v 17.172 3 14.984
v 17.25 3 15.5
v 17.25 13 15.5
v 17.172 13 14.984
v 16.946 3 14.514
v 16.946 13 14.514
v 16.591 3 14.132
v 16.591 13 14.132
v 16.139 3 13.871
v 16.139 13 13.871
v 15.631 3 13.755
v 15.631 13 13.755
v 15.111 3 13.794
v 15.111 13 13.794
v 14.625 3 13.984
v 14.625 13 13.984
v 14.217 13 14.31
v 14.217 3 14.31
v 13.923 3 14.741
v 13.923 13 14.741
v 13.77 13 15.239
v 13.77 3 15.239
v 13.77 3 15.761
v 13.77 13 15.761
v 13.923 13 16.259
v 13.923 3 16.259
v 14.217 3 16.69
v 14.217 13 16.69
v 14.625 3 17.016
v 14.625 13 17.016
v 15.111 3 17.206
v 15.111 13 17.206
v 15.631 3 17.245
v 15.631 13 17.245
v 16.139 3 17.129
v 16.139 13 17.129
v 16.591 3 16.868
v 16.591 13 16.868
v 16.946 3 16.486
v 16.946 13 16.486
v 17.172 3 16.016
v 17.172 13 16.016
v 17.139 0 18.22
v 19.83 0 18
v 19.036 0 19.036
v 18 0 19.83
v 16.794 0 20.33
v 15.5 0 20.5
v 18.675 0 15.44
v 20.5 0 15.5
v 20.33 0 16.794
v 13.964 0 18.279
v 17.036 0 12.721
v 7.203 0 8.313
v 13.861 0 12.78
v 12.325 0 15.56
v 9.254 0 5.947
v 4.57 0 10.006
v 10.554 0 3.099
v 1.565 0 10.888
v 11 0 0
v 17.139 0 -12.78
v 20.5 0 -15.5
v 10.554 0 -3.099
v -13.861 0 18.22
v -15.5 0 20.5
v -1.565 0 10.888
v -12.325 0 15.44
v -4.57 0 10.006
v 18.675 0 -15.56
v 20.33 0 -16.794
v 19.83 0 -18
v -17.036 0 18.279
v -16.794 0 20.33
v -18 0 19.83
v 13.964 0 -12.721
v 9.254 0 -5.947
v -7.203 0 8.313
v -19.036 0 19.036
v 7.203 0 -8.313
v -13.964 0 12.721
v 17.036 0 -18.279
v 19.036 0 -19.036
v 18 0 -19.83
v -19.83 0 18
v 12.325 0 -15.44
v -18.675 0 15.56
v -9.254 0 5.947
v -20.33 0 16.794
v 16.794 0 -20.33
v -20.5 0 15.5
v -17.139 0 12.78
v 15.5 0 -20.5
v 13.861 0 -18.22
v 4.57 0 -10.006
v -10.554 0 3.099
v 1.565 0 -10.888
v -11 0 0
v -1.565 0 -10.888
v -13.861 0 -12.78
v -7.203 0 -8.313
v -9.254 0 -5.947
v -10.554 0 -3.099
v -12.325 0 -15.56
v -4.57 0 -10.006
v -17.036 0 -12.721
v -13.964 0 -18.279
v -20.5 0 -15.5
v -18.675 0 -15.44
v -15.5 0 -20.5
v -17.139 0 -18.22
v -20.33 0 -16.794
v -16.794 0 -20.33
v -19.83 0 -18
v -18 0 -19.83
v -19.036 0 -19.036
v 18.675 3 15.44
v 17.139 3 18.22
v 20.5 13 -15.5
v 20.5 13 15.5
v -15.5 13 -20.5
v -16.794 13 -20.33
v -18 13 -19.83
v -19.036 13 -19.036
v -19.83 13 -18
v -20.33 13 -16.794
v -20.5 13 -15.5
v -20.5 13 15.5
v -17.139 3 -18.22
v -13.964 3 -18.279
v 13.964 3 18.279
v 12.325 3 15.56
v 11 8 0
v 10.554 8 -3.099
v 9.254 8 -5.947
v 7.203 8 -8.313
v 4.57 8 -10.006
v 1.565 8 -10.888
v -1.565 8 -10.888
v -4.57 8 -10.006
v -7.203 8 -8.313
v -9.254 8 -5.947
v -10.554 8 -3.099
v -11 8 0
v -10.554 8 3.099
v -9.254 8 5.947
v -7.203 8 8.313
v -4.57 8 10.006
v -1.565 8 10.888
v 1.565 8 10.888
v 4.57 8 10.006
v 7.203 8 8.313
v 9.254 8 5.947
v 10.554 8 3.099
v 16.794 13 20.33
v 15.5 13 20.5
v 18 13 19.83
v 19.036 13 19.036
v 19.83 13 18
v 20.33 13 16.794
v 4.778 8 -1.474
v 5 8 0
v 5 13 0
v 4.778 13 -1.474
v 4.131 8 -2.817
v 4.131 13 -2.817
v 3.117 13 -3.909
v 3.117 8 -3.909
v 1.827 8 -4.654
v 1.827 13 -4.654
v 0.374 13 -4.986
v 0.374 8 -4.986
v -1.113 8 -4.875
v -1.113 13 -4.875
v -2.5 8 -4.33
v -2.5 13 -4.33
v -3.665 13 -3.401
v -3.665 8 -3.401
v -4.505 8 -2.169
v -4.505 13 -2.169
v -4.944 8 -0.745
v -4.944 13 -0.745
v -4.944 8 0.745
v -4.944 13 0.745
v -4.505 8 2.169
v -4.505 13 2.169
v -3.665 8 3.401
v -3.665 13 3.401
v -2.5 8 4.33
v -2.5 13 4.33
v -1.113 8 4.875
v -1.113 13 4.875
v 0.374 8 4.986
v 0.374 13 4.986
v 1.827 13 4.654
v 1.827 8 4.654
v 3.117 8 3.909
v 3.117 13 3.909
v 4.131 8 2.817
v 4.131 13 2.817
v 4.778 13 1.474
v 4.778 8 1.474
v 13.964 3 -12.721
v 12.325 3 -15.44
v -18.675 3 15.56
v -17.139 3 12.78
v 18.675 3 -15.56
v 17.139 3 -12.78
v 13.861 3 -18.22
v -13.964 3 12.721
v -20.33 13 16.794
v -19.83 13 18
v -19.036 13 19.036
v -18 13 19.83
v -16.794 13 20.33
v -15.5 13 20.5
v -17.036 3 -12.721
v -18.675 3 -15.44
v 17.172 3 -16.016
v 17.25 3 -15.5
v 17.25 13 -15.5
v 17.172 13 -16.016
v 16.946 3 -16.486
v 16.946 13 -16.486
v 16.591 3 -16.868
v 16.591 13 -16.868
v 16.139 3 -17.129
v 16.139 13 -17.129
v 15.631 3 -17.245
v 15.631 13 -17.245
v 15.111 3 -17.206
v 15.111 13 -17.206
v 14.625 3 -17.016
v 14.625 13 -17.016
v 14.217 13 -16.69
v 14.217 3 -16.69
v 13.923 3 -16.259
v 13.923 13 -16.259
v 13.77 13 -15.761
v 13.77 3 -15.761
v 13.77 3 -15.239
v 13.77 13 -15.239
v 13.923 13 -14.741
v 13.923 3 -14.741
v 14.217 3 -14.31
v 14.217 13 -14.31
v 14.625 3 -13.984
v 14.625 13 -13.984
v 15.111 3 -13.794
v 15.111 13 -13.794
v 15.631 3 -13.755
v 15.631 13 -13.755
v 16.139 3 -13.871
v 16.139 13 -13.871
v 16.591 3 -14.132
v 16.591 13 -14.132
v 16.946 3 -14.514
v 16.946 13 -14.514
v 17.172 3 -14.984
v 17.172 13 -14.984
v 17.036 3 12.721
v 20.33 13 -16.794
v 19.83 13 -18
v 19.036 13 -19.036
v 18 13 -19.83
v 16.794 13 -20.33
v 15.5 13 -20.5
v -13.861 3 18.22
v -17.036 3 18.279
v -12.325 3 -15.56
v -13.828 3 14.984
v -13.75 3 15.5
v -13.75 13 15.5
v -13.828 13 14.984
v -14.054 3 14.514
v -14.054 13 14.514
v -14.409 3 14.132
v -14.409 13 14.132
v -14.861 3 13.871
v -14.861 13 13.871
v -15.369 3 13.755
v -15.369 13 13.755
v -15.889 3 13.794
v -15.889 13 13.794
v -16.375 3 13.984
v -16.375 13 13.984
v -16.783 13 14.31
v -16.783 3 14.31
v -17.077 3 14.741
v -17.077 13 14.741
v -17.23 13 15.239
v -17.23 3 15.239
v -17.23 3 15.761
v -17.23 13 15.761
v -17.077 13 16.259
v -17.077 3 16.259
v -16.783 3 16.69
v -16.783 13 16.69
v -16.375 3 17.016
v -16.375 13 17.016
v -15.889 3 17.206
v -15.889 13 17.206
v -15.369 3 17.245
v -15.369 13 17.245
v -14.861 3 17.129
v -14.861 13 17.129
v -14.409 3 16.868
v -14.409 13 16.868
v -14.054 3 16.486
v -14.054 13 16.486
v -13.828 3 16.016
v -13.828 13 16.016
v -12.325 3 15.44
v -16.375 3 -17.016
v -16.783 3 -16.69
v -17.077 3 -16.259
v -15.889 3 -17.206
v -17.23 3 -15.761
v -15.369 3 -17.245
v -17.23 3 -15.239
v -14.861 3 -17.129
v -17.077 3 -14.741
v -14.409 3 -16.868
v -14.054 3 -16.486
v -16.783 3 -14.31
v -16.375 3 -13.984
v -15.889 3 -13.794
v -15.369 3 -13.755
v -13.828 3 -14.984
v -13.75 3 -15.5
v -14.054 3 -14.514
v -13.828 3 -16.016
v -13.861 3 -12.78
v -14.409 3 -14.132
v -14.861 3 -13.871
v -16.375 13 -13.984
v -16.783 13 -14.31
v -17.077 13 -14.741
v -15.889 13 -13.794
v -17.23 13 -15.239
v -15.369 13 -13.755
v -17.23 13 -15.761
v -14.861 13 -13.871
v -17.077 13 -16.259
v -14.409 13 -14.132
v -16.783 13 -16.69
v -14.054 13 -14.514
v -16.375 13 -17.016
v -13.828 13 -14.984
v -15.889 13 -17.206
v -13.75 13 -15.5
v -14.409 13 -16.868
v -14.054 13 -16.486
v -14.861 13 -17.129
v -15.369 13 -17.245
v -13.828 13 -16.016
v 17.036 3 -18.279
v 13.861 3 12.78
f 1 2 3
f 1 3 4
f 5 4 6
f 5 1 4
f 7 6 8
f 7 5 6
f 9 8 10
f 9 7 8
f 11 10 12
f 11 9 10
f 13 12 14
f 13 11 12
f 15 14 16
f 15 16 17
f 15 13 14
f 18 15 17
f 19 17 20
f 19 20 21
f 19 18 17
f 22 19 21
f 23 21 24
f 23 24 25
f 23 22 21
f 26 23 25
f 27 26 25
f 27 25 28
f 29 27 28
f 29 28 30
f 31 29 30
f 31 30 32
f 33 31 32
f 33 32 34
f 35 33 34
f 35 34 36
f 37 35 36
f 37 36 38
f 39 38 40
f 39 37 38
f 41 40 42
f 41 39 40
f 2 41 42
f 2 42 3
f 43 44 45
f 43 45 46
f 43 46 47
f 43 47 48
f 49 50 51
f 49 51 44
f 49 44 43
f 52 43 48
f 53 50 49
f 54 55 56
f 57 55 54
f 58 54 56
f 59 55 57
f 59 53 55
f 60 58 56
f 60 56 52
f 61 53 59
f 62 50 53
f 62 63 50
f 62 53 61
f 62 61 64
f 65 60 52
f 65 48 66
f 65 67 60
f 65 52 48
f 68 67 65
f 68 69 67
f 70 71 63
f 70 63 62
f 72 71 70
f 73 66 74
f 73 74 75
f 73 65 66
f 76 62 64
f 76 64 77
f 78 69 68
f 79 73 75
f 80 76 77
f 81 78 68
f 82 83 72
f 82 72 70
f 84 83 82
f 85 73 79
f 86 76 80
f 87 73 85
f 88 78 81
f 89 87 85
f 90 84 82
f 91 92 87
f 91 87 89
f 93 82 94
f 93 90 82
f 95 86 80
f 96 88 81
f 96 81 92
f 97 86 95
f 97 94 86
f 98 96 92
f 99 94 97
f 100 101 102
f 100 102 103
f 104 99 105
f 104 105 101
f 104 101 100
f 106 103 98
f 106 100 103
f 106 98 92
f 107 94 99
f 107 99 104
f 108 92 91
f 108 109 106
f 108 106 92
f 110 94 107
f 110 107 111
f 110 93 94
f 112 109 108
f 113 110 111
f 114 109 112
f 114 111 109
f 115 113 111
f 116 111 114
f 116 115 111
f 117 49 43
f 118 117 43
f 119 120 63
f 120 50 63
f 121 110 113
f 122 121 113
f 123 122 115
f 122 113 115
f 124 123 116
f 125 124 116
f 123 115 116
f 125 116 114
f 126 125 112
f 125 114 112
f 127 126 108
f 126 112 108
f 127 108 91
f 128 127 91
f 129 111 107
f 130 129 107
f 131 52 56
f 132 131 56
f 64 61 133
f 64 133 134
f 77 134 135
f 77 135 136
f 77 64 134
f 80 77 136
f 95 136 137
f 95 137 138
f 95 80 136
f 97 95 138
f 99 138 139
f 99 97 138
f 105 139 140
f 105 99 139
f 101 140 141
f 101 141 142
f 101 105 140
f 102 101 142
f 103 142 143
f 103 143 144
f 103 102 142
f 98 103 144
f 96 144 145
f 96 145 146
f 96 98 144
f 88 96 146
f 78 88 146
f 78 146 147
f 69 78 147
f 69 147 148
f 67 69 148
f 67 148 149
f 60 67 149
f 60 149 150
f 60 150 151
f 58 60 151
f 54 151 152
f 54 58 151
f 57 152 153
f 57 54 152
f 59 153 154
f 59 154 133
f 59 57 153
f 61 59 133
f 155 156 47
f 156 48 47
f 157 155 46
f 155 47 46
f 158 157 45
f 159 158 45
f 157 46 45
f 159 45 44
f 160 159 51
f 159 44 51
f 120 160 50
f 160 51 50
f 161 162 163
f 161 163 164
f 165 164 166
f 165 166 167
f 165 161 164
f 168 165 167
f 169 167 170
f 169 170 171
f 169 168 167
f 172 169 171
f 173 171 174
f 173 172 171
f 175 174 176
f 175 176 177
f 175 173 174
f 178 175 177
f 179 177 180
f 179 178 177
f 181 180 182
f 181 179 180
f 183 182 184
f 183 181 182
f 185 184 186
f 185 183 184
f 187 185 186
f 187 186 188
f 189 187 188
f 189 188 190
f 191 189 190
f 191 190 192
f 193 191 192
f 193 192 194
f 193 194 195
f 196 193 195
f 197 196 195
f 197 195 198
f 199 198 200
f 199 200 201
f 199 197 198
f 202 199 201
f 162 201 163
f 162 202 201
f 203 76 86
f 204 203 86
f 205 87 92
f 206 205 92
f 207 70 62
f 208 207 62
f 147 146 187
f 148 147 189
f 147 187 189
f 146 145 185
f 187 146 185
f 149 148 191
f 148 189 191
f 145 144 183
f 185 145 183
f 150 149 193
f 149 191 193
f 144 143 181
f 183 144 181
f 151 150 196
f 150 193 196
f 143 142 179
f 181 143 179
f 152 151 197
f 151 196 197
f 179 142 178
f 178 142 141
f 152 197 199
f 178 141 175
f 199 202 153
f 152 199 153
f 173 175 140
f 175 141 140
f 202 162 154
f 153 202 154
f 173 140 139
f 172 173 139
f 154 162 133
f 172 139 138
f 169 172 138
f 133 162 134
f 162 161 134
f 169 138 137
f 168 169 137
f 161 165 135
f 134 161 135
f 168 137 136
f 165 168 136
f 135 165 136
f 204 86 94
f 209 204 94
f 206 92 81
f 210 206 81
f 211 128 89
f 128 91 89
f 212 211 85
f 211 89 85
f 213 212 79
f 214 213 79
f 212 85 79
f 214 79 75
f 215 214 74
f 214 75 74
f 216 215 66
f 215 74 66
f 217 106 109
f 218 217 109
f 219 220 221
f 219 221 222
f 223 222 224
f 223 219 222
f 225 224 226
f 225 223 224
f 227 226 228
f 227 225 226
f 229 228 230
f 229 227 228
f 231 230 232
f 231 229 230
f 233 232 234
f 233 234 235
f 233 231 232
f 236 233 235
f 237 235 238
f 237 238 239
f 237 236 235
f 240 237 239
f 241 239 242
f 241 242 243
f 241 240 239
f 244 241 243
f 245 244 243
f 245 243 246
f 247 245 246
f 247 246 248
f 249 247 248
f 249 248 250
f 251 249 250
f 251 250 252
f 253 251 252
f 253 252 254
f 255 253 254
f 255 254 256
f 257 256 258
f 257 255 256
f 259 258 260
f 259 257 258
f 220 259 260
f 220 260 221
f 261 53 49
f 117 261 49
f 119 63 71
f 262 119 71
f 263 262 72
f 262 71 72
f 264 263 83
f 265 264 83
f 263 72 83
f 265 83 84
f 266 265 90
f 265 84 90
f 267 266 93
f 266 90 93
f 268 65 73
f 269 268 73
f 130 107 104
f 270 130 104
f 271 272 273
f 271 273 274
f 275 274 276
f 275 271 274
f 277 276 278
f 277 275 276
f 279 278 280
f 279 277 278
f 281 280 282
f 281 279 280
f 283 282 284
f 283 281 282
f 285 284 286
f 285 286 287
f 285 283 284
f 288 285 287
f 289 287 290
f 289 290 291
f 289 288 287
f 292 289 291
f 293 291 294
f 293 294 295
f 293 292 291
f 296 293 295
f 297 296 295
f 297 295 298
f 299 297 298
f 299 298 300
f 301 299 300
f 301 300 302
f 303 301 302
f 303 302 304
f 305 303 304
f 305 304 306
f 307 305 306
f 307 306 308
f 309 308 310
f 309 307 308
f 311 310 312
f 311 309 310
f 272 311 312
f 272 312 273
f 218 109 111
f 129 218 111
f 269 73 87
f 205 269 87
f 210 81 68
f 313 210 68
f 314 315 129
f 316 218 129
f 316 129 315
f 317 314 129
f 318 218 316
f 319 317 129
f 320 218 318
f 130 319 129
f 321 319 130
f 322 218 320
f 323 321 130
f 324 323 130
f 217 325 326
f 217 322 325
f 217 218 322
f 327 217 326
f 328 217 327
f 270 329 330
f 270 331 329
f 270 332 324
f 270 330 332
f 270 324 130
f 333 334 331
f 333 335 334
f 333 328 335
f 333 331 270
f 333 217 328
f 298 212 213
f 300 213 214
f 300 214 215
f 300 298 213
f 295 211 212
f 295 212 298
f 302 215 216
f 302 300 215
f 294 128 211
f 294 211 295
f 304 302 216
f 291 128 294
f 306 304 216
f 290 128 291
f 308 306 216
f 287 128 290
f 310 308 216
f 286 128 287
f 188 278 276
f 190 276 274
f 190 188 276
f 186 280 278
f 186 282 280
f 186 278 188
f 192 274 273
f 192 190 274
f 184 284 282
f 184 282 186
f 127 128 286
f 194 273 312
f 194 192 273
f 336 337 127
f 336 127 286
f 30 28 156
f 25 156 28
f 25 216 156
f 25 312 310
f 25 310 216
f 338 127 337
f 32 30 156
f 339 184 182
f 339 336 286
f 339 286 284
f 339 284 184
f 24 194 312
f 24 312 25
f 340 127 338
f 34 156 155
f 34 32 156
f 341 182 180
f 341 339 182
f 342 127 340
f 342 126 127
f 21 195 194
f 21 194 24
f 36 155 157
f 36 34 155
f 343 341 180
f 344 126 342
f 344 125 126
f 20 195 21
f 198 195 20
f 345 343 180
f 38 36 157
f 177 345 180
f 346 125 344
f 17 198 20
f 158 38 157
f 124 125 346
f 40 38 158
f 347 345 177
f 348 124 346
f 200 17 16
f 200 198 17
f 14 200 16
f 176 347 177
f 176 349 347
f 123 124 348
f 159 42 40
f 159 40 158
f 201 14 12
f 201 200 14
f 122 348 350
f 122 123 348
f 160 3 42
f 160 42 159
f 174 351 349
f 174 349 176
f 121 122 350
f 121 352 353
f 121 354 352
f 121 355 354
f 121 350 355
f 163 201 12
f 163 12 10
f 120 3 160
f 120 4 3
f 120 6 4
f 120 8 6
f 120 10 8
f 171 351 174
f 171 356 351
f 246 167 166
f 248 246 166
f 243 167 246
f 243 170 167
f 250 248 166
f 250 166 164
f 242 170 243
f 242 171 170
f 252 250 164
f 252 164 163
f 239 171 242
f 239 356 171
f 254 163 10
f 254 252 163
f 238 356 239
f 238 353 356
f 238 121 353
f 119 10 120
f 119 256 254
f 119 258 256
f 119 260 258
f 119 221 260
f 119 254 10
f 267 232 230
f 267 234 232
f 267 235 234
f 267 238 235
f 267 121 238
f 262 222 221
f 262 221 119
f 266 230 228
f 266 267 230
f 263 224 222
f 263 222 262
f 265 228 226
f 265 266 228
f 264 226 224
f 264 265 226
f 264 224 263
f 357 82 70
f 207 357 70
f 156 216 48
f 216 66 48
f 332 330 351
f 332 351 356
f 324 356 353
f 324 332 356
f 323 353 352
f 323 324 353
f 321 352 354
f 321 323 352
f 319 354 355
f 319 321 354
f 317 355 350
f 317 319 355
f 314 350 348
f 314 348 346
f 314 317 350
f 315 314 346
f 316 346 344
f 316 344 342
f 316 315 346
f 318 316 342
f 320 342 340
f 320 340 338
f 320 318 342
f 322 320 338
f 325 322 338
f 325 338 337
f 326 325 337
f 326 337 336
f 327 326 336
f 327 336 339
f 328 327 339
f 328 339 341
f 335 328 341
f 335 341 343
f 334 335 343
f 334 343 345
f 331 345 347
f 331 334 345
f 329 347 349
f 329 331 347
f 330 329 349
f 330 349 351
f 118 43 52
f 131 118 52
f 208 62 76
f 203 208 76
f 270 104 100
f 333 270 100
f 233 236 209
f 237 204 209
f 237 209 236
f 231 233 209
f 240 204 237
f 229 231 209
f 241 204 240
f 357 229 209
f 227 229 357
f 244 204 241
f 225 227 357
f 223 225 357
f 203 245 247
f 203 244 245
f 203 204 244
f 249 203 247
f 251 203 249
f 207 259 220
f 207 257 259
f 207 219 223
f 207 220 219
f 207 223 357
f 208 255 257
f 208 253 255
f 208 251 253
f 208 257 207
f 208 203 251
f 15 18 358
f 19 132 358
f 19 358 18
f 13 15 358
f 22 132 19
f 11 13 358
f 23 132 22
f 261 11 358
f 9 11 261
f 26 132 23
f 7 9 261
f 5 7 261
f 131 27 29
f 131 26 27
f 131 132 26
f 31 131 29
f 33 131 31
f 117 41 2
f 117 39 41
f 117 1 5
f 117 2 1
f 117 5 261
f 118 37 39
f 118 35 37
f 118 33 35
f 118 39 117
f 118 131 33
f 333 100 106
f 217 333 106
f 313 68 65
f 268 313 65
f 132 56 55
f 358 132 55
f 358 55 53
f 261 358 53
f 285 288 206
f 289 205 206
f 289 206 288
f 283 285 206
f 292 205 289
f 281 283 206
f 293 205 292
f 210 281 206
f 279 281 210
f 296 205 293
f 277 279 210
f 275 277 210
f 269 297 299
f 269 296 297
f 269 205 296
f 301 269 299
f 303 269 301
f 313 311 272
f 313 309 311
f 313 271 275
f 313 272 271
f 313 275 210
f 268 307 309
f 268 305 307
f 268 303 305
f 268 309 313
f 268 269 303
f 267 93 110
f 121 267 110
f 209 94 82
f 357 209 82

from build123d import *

# Parameters (mm, degrees)
SKETCH1_R           = 11
SKETCH1_R_2         = 1.75
BOSS_EXTRUDE1_DEPTH = 8
SKETCH2_R           = 1.75
SKETCH2_R_2         = 5
BOSS_EXTRUDE2_DEPTH = 5
CUT_EXTRUDE1_DEPTH  = 3


with BuildPart() as part:
    # Sketch1 → Boss-Extrude1 (new body)
    with BuildSketch(Plane(origin=(0, 0, 0), x_dir=(1, 0, 0), z_dir=(0, 1, 0))):
        with BuildLine():
            Line((-15.5, 20.5), (15.5, 20.5))
            ThreePointArc((15.5, 20.5), (19.035533906, 19.035533906), (20.5, 15.5))
            Line((20.5, 15.5), (20.5, -15.5))
            ThreePointArc((20.5, -15.5), (19.035533906, -19.035533906), (15.5, -20.5))
            Line((15.5, -20.5), (-15.5, -20.5))
            ThreePointArc((-15.5, -20.5), (-19.035533906, -19.035533906), (-20.5, -15.5))
            Line((-20.5, -15.5), (-20.5, 15.5))
            ThreePointArc((-20.5, 15.5), (-19.035533906, 19.035533906), (-15.5, 20.5))
        make_face()
        Circle(SKETCH1_R, mode=Mode.SUBTRACT)
        with Locations((-15.5, 15.5)):
            Circle(SKETCH1_R_2, mode=Mode.SUBTRACT)
        with Locations((15.5, 15.5)):
            Circle(SKETCH1_R_2, mode=Mode.SUBTRACT)
        with Locations((15.5, -15.5)):
            Circle(SKETCH1_R_2, mode=Mode.SUBTRACT)
        with Locations((-15.5, -15.5)):
            Circle(SKETCH1_R_2, mode=Mode.SUBTRACT)
    extrude(amount=BOSS_EXTRUDE1_DEPTH)

    # Sketch2 → Boss-Extrude2 (add)
    with BuildSketch(Plane(origin=(0, 8, 0), x_dir=(1, 0, 0), z_dir=(0, 1, 0))):
        with BuildLine():
            Line((-20.5, 15.5), (-20.5, -15.5))
            ThreePointArc((-20.5, -15.5), (-19.035533906, -19.035533906), (-15.5, -20.5))
            Line((-15.5, -20.5), (15.5, -20.5))
            ThreePointArc((15.5, -20.5), (19.035533906, -19.035533906), (20.5, -15.5))
            Line((20.5, -15.5), (20.5, 15.5))
            ThreePointArc((20.5, 15.5), (19.035533906, 19.035533906), (15.5, 20.5))
            Line((15.5, 20.5), (-15.5, 20.5))
            ThreePointArc((-15.5, 20.5), (-19.035533906, 19.035533906), (-20.5, 15.5))
        make_face()
        with Locations((15.5, 15.5)):
            Circle(SKETCH2_R, mode=Mode.SUBTRACT)
        with Locations((15.5, -15.5)):
            Circle(SKETCH2_R, mode=Mode.SUBTRACT)
        with Locations((-15.5, 15.5)):
            Circle(SKETCH2_R, mode=Mode.SUBTRACT)
        Circle(SKETCH2_R_2, mode=Mode.SUBTRACT)
        with Locations((-15.5, -15.5)):
            Circle(SKETCH2_R, mode=Mode.SUBTRACT)
    extrude(amount=BOSS_EXTRUDE2_DEPTH)

    # Sketch3 → Cut-Extrude1 (cut)
    with BuildSketch(Plane.XZ):
        Polygon((-13.860691665, 18.219559066), (-17.035553071, 18.279462196), (-18.674861406, 15.55990313), (-17.139308335, 12.780440934), (-13.964446929, 12.720537804), (-12.325138594, 15.44009687), align=None)
        Polygon((12.325138594, 15.55990313), (13.860691665, 12.780440934), (17.035553071, 12.720537804), (18.674861406, 15.44009687), (17.139308335, 18.219559066), (13.964446929, 18.279462196), align=None)
        Polygon((13.964446929, -12.720537804), (12.325138594, -15.44009687), (13.860691665, -18.219559066), (17.035553071, -18.279462196), (18.674861406, -15.55990313), (17.139308335, -12.780440934), align=None)
        Polygon((-13.860691665, -12.780440934), (-17.035553071, -12.720537804), (-18.674861406, -15.44009687), (-17.139308335, -18.219559066), (-13.964446929, -18.279462196), (-12.325138594, -15.55990313), align=None)
    extrude(amount=-CUT_EXTRUDE1_DEPTH, mode=Mode.SUBTRACT)


solid = part.part
